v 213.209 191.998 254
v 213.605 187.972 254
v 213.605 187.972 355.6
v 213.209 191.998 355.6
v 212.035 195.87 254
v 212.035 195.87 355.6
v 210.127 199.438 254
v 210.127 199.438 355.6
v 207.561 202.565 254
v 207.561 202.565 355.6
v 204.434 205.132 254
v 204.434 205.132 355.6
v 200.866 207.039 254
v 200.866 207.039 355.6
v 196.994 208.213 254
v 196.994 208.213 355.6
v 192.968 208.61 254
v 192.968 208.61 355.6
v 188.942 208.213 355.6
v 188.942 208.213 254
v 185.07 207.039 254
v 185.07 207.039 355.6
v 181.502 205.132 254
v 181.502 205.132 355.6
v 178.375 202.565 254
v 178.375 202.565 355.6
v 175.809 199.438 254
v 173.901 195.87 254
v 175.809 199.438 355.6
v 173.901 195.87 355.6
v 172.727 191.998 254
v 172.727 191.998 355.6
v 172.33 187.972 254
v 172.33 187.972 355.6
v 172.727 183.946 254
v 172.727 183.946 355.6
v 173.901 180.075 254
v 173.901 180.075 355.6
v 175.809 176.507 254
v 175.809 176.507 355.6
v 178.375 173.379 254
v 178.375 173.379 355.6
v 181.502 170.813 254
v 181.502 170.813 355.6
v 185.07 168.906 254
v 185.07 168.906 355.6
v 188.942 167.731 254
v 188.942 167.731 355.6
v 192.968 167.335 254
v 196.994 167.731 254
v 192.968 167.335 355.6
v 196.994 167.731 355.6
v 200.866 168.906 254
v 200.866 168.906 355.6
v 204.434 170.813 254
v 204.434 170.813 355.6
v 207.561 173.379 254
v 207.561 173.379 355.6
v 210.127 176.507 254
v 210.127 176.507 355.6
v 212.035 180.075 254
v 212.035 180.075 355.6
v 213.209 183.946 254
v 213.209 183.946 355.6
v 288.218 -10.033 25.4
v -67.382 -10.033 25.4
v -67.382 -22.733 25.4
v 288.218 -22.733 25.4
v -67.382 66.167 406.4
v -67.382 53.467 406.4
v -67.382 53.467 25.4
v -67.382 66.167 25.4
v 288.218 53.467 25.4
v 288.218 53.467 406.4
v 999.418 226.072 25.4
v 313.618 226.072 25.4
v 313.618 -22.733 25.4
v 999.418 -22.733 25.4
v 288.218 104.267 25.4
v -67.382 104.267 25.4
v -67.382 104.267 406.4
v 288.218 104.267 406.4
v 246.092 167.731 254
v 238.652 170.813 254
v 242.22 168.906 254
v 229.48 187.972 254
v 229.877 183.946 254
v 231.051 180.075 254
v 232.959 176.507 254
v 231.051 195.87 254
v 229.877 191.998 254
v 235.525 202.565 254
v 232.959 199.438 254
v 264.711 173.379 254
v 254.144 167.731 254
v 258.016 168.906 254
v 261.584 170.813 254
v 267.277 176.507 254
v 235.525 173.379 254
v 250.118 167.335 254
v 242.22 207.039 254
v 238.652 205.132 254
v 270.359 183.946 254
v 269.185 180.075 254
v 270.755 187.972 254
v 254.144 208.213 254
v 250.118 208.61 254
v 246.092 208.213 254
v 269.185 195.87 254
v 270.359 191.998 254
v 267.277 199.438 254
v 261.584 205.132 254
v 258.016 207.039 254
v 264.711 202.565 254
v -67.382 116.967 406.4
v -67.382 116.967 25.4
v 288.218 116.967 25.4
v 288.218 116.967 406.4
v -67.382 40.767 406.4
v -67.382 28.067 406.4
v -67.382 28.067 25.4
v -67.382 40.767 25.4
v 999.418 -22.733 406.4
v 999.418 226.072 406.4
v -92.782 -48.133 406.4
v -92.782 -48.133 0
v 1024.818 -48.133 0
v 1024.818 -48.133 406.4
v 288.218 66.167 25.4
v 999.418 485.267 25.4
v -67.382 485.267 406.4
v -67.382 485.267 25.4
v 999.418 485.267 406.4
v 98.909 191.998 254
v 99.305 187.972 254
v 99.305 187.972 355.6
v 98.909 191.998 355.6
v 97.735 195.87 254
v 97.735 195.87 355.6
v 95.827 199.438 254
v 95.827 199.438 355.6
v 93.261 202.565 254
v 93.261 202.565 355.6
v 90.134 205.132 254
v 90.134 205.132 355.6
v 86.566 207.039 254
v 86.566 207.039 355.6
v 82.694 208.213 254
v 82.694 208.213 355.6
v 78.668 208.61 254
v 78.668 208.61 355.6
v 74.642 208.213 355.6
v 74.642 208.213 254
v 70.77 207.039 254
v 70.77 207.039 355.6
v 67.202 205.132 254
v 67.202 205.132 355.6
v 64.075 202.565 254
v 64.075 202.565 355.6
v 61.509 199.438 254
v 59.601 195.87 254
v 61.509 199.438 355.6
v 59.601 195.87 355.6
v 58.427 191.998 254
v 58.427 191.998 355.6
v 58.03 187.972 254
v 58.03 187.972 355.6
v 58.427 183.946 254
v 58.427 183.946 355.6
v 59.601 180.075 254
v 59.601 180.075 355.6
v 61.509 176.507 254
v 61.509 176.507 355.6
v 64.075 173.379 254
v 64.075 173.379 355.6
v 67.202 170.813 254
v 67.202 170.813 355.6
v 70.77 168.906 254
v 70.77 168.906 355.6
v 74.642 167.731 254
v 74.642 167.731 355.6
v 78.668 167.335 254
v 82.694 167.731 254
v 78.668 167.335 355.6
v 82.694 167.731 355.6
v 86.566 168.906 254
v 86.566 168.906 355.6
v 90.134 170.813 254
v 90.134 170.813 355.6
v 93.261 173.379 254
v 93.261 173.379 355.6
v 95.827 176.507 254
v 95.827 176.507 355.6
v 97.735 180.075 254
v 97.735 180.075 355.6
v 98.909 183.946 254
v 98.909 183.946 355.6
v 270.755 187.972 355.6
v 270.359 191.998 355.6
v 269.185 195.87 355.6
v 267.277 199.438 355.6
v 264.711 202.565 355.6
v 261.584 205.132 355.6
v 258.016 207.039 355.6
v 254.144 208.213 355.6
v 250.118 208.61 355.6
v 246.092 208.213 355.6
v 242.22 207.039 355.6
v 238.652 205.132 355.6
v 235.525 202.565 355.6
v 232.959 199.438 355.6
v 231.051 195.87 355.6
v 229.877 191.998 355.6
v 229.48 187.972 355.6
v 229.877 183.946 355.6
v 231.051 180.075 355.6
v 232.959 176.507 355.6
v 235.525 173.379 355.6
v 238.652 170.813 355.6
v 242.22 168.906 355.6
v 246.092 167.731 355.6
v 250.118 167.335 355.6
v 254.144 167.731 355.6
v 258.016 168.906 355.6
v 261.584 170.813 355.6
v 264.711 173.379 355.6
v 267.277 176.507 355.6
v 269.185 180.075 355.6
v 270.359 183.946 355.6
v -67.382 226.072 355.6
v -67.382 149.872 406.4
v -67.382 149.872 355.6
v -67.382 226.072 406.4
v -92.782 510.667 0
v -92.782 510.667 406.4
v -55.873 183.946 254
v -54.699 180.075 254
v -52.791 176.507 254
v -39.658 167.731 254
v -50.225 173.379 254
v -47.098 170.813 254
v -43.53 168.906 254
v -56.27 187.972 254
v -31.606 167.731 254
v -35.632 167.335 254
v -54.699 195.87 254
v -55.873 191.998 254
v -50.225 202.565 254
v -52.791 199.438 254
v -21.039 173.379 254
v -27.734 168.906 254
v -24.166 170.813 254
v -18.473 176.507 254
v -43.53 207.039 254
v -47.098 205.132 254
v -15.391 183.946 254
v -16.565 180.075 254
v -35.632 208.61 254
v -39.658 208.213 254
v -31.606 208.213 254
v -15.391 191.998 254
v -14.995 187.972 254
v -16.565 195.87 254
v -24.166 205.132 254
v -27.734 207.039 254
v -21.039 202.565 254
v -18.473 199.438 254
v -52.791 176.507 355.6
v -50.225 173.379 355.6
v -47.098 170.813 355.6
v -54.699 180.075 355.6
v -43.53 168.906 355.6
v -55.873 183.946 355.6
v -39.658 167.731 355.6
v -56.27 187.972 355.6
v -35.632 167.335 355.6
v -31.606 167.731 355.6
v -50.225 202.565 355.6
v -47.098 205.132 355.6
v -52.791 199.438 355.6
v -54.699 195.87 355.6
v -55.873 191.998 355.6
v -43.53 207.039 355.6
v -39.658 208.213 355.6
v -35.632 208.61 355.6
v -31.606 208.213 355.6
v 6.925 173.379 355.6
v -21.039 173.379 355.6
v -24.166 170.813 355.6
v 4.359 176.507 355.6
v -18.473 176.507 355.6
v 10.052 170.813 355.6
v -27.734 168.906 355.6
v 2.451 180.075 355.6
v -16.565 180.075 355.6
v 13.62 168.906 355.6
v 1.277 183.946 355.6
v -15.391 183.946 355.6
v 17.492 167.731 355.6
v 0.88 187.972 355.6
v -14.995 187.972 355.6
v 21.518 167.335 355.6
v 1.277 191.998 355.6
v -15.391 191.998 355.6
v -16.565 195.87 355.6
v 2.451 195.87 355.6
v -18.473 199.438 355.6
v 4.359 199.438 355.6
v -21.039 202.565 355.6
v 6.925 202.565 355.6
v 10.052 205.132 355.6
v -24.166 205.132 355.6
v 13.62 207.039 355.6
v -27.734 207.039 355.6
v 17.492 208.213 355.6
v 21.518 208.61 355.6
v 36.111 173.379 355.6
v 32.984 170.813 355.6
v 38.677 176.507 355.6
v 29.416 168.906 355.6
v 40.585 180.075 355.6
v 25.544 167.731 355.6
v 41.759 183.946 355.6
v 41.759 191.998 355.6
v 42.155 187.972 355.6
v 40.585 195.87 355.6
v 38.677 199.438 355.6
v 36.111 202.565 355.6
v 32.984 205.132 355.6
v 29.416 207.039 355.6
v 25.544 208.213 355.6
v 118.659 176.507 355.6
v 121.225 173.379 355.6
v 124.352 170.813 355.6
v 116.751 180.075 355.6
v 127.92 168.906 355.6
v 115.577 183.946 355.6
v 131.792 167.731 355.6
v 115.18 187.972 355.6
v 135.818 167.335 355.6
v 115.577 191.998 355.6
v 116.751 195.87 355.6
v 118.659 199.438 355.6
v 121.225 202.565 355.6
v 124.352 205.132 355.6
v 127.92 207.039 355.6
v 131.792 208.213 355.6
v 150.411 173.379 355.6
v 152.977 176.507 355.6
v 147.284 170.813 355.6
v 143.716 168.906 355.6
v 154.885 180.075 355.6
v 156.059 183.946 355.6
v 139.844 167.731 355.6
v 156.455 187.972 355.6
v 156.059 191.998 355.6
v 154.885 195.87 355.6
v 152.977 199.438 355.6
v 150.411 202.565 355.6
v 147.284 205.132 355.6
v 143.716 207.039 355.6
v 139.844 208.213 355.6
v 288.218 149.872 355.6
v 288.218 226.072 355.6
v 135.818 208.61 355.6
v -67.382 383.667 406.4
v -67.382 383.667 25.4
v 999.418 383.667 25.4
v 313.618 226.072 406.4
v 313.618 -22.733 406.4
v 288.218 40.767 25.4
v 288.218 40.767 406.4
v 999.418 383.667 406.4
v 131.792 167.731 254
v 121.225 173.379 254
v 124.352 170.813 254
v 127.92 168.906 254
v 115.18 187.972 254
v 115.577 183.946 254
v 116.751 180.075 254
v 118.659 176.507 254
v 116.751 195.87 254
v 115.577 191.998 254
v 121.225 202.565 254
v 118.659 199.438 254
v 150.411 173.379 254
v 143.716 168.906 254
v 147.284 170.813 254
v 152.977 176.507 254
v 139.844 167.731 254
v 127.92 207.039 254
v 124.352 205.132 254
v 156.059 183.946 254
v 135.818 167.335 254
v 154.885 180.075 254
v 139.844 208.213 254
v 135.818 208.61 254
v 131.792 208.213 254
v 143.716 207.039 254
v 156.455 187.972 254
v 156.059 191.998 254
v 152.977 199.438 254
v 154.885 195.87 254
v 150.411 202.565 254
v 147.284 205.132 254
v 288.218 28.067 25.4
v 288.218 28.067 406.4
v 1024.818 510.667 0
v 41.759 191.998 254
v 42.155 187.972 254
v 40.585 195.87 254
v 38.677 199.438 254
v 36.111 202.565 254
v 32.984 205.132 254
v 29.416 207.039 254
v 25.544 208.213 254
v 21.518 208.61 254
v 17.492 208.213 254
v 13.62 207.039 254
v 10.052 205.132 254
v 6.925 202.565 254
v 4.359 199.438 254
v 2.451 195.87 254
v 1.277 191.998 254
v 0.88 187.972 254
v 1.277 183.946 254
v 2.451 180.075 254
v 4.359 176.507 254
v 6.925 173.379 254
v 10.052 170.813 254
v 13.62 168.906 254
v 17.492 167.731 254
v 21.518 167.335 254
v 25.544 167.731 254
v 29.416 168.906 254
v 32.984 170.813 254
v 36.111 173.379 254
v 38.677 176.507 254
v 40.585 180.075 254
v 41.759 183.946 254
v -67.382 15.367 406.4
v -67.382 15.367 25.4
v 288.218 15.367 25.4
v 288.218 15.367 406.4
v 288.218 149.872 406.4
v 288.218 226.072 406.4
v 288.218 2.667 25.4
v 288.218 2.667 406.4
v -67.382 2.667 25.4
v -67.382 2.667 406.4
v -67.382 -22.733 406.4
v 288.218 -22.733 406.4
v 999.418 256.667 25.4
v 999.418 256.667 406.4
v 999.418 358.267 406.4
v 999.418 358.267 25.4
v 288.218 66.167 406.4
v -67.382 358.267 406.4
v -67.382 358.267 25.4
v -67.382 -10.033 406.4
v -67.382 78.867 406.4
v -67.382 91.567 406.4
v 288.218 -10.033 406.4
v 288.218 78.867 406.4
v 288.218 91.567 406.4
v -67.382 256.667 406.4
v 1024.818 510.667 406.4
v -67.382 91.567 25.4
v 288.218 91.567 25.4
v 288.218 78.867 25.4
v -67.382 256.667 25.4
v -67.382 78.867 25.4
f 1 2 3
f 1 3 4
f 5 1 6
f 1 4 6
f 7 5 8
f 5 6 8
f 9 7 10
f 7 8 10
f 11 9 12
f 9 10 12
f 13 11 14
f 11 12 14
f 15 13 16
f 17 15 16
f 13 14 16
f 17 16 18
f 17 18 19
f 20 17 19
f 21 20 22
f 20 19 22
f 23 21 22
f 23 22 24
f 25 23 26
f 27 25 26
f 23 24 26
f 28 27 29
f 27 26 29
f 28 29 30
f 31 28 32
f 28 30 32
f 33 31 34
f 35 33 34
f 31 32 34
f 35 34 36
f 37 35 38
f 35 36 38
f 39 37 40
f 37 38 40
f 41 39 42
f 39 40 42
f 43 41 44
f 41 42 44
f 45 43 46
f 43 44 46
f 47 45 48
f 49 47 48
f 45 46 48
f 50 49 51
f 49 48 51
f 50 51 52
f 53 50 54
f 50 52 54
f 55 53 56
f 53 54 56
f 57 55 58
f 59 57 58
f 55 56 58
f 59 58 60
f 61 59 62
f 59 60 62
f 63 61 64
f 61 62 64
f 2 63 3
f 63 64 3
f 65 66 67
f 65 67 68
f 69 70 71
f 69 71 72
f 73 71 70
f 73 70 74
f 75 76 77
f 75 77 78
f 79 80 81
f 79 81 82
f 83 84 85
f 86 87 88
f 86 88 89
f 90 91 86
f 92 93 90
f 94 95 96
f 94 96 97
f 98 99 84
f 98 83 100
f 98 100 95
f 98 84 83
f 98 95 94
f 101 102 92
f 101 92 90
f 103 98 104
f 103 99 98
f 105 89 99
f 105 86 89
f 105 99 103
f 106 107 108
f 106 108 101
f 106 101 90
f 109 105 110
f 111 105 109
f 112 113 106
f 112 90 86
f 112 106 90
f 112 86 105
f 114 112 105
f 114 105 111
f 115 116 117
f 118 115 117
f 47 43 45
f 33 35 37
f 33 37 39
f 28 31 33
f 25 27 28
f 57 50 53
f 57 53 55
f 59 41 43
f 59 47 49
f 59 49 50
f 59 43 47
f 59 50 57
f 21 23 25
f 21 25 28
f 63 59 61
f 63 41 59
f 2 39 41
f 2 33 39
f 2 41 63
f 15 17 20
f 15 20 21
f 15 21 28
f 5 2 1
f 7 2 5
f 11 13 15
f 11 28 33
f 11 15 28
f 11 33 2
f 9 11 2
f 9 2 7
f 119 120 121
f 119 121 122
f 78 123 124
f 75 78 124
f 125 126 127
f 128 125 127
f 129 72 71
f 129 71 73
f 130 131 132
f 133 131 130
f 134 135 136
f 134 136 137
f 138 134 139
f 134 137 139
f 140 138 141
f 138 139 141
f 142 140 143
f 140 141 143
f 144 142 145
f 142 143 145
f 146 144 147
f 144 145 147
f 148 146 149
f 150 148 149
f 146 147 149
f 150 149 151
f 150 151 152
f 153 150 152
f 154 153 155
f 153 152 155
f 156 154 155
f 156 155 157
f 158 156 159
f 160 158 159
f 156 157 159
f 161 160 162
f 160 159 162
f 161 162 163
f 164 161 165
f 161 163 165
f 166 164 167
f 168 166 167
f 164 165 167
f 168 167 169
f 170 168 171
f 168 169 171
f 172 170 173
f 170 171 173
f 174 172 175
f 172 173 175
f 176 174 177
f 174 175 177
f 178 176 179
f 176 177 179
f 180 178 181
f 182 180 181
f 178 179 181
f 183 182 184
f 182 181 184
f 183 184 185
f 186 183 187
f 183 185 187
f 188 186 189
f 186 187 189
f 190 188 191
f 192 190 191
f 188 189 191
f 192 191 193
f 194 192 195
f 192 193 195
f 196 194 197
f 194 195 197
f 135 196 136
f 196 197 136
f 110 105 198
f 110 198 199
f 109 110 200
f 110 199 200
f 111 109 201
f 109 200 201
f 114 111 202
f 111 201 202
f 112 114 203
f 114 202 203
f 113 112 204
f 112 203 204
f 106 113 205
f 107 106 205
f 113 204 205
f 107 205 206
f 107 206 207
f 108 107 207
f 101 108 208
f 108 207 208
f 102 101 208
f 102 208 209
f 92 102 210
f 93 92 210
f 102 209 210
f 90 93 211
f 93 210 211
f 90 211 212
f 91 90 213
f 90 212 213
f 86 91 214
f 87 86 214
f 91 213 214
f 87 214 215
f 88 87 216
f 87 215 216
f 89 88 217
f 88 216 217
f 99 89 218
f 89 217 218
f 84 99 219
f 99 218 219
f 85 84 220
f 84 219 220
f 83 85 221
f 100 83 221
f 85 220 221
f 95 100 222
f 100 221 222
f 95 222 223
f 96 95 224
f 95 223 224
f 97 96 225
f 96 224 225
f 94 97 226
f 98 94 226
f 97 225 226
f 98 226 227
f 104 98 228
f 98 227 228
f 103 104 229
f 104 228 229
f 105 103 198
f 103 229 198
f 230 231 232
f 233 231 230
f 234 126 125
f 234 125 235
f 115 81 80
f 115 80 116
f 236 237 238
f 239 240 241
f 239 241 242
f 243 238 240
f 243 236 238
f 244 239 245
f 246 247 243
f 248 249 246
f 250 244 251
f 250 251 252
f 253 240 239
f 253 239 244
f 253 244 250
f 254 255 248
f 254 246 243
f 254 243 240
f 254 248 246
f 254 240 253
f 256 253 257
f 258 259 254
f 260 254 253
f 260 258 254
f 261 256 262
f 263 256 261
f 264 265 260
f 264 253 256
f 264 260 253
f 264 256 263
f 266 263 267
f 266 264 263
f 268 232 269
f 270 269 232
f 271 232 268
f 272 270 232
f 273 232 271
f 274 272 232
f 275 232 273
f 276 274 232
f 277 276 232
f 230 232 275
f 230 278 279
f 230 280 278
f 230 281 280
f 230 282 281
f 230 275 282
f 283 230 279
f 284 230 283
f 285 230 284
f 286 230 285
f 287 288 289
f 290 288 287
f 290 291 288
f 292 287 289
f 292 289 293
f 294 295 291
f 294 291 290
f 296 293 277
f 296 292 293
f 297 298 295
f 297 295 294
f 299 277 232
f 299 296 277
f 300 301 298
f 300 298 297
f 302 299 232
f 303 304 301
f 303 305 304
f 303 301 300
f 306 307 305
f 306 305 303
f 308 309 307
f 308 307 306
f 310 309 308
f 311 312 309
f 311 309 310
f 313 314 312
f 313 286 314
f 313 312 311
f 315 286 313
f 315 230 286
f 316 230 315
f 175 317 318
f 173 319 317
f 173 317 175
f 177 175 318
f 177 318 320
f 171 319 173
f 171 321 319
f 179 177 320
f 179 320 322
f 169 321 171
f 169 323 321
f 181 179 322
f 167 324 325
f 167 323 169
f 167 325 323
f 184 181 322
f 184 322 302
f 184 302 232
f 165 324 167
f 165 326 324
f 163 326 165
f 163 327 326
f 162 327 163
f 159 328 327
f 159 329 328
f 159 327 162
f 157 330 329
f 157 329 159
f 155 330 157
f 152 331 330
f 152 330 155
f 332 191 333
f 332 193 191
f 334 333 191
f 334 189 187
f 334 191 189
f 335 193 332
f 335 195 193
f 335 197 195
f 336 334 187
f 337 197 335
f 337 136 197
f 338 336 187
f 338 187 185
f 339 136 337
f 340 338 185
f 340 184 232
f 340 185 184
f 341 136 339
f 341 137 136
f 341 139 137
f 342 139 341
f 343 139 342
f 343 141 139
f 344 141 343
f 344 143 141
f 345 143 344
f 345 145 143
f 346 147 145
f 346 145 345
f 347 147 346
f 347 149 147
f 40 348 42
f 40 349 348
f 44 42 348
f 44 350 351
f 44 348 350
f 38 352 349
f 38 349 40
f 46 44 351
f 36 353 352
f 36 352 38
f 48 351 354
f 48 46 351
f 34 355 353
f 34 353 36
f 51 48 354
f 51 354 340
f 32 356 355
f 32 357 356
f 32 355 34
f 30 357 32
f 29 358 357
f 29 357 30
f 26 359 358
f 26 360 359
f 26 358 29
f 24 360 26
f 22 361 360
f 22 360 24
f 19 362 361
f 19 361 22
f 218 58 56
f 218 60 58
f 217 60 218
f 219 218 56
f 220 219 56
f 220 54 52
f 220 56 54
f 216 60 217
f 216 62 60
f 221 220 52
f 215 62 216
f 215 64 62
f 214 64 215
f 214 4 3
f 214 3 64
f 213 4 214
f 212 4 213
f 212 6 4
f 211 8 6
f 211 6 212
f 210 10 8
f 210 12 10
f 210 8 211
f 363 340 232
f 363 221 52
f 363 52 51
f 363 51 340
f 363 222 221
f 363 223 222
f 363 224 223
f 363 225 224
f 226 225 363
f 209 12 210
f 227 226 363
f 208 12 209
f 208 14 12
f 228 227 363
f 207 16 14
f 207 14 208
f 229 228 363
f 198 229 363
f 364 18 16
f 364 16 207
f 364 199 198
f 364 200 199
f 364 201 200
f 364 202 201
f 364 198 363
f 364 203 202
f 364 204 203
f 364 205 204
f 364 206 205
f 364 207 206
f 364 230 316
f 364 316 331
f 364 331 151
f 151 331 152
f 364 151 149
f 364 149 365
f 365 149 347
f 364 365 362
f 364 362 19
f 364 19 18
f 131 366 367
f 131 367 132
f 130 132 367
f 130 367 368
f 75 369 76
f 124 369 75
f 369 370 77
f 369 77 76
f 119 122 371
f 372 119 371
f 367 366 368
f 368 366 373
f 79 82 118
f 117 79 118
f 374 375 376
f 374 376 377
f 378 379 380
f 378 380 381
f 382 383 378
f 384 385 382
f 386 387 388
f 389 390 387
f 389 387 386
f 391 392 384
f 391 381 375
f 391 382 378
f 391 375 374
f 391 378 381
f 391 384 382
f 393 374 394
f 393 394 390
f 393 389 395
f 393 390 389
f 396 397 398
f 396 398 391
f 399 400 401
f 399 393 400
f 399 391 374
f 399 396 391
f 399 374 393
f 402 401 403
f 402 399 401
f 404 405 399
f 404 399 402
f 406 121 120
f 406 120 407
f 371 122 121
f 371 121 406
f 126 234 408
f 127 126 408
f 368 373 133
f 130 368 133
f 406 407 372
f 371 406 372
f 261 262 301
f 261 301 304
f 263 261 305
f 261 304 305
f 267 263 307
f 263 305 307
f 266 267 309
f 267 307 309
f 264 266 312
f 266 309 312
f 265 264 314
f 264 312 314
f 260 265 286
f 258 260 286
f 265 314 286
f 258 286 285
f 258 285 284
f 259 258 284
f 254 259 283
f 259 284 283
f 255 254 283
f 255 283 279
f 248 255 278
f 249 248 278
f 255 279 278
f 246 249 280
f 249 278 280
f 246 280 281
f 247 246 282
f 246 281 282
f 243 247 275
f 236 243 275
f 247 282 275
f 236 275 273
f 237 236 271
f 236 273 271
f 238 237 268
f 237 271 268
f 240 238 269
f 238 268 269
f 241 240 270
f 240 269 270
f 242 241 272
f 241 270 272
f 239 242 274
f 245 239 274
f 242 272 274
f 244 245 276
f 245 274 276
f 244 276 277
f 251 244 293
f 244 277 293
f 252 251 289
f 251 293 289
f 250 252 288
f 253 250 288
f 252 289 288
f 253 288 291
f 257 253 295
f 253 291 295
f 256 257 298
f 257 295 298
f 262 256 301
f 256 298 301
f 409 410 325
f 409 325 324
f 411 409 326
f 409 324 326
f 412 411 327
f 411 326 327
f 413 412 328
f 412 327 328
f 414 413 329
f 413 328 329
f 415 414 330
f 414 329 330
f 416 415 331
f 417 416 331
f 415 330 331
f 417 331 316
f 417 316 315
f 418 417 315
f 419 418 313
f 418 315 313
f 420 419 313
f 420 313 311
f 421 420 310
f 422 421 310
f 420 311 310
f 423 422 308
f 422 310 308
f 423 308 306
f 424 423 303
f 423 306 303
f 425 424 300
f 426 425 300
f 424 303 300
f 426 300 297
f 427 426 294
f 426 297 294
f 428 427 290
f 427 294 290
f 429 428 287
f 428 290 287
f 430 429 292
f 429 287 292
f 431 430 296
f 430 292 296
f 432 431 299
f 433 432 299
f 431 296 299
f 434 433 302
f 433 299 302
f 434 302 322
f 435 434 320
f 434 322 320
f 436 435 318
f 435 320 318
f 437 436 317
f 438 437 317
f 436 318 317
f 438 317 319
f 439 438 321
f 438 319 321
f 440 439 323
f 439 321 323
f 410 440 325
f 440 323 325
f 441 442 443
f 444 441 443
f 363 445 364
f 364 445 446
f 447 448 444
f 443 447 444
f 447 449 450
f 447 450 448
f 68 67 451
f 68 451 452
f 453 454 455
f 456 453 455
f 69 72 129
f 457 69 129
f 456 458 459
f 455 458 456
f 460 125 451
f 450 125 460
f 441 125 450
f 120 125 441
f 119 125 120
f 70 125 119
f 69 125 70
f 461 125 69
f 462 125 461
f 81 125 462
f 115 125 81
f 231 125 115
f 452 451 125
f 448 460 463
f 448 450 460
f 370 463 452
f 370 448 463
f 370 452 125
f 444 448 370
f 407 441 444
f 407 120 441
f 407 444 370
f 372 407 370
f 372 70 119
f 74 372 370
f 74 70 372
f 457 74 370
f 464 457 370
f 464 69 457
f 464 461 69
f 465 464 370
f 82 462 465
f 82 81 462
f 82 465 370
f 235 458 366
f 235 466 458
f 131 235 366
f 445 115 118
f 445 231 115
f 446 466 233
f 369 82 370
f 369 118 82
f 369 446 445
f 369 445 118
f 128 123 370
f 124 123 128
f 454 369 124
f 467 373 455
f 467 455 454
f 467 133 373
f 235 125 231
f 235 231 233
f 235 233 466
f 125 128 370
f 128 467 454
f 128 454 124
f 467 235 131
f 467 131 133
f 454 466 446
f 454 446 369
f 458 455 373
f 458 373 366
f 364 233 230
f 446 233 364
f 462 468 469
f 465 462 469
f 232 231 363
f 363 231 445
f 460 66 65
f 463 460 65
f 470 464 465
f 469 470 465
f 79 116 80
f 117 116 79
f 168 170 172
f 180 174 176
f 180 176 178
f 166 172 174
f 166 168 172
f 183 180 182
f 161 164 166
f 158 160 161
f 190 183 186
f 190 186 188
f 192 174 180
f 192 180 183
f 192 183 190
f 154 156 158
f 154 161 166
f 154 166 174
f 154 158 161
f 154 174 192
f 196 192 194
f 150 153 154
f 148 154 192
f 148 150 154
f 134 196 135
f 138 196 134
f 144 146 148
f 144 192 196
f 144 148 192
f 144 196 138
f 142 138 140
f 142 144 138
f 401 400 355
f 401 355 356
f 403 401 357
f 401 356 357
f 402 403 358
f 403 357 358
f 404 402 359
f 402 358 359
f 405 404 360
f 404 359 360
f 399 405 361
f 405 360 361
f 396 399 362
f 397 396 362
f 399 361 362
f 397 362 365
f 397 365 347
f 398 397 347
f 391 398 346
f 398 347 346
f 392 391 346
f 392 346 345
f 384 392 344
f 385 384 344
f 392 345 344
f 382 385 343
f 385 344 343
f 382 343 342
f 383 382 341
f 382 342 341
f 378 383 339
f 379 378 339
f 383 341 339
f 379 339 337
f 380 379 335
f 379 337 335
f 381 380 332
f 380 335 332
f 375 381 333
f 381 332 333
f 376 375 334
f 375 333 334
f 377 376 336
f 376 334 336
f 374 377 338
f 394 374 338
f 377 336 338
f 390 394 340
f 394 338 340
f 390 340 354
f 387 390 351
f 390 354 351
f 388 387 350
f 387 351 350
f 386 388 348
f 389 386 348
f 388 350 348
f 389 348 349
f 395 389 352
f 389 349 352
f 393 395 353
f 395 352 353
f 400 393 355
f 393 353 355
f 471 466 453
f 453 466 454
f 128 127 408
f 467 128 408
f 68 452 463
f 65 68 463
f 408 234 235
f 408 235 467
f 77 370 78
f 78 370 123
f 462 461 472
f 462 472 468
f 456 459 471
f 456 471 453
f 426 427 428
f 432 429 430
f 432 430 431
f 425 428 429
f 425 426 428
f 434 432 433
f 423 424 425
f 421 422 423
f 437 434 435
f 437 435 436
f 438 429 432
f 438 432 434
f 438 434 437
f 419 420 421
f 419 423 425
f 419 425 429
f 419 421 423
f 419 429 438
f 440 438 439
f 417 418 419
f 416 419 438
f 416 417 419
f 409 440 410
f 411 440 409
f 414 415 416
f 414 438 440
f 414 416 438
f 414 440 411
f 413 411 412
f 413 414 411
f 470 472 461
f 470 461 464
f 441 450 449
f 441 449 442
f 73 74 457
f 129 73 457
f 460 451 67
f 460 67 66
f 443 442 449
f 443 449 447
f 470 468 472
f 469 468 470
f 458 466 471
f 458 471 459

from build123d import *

# Parameters (mm, degrees)
F0_W     = 1117.6
F0_H     = 558.8
F1_DEPTH = 406.4
F2_W     = 355.6
F2_H     = 12.7
F2_W_2   = 1066.8
F2_H_2   = 101.6
F2_W_3   = 685.8
F2_H_3   = 248.804872
F3_DEPTH = 381
F4_W     = 355.6
F4_H     = 76.2
F5_DEPTH = 50.8
F6_R     = 20.6375
F7_DEPTH = 101.6


with BuildPart() as f1:
    # F0 (on Top) → F1 (new body)
    with BuildSketch(Plane.XY):
        with Locations((466.017957, 231.267335)):
            Rectangle(F0_W, F0_H)
    extrude(amount=F1_DEPTH)

    # F2 (on face) → F3 (cut)
    with BuildSketch(Plane.XY.offset(406.4)):
        with Locations((110.417957, -16.382665)):
            Rectangle(F2_W, F2_H)
        with Locations((110.417957, 9.017335)):
            Rectangle(F2_W, F2_H)
        with Locations((110.417957, 34.417335)):
            Rectangle(F2_W, F2_H)
        with Locations((110.417957, 59.817335)):
            Rectangle(F2_W, F2_H)
        with Locations((110.417957, 85.217335)):
            Rectangle(F2_W, F2_H)
        with Locations((110.417957, 110.617335)):
            Rectangle(F2_W, F2_H)
        with Locations((466.017957, 434.467335)):
            Rectangle(F2_W_2, F2_H_2)
        with Locations((466.017957, 307.467335)):
            Rectangle(F2_W_2, F2_H_2)
        with Locations((656.517957, 101.669771)):
            Rectangle(F2_W_3, F2_H_3)
    extrude(amount=-F3_DEPTH, mode=Mode.SUBTRACT)

    # F4 (on face) → F5 (cut)
    with BuildSketch(Plane.XY.offset(406.4)):
        with Locations((110.417957, 187.972207)):
            Rectangle(F4_W, F4_H)
    extrude(amount=-F5_DEPTH, mode=Mode.SUBTRACT)

    # F6 (on face) → F7 (cut)
    with BuildSketch(Plane.XY.offset(355.6)):
        with Locations((-35.632043, 187.972207)):
            Circle(F6_R)
        with Locations((21.517957, 187.972207)):
            Circle(F6_R)
        with Locations((78.667957, 187.972207)):
            Circle(F6_R)
        with Locations((135.817957, 187.972207)):
            Circle(F6_R)
        with Locations((192.967957, 187.972207)):
            Circle(F6_R)
        with Locations((250.117957, 187.972207)):
            Circle(F6_R)
    extrude(amount=-F7_DEPTH, mode=Mode.SUBTRACT)


solid = f1.part
